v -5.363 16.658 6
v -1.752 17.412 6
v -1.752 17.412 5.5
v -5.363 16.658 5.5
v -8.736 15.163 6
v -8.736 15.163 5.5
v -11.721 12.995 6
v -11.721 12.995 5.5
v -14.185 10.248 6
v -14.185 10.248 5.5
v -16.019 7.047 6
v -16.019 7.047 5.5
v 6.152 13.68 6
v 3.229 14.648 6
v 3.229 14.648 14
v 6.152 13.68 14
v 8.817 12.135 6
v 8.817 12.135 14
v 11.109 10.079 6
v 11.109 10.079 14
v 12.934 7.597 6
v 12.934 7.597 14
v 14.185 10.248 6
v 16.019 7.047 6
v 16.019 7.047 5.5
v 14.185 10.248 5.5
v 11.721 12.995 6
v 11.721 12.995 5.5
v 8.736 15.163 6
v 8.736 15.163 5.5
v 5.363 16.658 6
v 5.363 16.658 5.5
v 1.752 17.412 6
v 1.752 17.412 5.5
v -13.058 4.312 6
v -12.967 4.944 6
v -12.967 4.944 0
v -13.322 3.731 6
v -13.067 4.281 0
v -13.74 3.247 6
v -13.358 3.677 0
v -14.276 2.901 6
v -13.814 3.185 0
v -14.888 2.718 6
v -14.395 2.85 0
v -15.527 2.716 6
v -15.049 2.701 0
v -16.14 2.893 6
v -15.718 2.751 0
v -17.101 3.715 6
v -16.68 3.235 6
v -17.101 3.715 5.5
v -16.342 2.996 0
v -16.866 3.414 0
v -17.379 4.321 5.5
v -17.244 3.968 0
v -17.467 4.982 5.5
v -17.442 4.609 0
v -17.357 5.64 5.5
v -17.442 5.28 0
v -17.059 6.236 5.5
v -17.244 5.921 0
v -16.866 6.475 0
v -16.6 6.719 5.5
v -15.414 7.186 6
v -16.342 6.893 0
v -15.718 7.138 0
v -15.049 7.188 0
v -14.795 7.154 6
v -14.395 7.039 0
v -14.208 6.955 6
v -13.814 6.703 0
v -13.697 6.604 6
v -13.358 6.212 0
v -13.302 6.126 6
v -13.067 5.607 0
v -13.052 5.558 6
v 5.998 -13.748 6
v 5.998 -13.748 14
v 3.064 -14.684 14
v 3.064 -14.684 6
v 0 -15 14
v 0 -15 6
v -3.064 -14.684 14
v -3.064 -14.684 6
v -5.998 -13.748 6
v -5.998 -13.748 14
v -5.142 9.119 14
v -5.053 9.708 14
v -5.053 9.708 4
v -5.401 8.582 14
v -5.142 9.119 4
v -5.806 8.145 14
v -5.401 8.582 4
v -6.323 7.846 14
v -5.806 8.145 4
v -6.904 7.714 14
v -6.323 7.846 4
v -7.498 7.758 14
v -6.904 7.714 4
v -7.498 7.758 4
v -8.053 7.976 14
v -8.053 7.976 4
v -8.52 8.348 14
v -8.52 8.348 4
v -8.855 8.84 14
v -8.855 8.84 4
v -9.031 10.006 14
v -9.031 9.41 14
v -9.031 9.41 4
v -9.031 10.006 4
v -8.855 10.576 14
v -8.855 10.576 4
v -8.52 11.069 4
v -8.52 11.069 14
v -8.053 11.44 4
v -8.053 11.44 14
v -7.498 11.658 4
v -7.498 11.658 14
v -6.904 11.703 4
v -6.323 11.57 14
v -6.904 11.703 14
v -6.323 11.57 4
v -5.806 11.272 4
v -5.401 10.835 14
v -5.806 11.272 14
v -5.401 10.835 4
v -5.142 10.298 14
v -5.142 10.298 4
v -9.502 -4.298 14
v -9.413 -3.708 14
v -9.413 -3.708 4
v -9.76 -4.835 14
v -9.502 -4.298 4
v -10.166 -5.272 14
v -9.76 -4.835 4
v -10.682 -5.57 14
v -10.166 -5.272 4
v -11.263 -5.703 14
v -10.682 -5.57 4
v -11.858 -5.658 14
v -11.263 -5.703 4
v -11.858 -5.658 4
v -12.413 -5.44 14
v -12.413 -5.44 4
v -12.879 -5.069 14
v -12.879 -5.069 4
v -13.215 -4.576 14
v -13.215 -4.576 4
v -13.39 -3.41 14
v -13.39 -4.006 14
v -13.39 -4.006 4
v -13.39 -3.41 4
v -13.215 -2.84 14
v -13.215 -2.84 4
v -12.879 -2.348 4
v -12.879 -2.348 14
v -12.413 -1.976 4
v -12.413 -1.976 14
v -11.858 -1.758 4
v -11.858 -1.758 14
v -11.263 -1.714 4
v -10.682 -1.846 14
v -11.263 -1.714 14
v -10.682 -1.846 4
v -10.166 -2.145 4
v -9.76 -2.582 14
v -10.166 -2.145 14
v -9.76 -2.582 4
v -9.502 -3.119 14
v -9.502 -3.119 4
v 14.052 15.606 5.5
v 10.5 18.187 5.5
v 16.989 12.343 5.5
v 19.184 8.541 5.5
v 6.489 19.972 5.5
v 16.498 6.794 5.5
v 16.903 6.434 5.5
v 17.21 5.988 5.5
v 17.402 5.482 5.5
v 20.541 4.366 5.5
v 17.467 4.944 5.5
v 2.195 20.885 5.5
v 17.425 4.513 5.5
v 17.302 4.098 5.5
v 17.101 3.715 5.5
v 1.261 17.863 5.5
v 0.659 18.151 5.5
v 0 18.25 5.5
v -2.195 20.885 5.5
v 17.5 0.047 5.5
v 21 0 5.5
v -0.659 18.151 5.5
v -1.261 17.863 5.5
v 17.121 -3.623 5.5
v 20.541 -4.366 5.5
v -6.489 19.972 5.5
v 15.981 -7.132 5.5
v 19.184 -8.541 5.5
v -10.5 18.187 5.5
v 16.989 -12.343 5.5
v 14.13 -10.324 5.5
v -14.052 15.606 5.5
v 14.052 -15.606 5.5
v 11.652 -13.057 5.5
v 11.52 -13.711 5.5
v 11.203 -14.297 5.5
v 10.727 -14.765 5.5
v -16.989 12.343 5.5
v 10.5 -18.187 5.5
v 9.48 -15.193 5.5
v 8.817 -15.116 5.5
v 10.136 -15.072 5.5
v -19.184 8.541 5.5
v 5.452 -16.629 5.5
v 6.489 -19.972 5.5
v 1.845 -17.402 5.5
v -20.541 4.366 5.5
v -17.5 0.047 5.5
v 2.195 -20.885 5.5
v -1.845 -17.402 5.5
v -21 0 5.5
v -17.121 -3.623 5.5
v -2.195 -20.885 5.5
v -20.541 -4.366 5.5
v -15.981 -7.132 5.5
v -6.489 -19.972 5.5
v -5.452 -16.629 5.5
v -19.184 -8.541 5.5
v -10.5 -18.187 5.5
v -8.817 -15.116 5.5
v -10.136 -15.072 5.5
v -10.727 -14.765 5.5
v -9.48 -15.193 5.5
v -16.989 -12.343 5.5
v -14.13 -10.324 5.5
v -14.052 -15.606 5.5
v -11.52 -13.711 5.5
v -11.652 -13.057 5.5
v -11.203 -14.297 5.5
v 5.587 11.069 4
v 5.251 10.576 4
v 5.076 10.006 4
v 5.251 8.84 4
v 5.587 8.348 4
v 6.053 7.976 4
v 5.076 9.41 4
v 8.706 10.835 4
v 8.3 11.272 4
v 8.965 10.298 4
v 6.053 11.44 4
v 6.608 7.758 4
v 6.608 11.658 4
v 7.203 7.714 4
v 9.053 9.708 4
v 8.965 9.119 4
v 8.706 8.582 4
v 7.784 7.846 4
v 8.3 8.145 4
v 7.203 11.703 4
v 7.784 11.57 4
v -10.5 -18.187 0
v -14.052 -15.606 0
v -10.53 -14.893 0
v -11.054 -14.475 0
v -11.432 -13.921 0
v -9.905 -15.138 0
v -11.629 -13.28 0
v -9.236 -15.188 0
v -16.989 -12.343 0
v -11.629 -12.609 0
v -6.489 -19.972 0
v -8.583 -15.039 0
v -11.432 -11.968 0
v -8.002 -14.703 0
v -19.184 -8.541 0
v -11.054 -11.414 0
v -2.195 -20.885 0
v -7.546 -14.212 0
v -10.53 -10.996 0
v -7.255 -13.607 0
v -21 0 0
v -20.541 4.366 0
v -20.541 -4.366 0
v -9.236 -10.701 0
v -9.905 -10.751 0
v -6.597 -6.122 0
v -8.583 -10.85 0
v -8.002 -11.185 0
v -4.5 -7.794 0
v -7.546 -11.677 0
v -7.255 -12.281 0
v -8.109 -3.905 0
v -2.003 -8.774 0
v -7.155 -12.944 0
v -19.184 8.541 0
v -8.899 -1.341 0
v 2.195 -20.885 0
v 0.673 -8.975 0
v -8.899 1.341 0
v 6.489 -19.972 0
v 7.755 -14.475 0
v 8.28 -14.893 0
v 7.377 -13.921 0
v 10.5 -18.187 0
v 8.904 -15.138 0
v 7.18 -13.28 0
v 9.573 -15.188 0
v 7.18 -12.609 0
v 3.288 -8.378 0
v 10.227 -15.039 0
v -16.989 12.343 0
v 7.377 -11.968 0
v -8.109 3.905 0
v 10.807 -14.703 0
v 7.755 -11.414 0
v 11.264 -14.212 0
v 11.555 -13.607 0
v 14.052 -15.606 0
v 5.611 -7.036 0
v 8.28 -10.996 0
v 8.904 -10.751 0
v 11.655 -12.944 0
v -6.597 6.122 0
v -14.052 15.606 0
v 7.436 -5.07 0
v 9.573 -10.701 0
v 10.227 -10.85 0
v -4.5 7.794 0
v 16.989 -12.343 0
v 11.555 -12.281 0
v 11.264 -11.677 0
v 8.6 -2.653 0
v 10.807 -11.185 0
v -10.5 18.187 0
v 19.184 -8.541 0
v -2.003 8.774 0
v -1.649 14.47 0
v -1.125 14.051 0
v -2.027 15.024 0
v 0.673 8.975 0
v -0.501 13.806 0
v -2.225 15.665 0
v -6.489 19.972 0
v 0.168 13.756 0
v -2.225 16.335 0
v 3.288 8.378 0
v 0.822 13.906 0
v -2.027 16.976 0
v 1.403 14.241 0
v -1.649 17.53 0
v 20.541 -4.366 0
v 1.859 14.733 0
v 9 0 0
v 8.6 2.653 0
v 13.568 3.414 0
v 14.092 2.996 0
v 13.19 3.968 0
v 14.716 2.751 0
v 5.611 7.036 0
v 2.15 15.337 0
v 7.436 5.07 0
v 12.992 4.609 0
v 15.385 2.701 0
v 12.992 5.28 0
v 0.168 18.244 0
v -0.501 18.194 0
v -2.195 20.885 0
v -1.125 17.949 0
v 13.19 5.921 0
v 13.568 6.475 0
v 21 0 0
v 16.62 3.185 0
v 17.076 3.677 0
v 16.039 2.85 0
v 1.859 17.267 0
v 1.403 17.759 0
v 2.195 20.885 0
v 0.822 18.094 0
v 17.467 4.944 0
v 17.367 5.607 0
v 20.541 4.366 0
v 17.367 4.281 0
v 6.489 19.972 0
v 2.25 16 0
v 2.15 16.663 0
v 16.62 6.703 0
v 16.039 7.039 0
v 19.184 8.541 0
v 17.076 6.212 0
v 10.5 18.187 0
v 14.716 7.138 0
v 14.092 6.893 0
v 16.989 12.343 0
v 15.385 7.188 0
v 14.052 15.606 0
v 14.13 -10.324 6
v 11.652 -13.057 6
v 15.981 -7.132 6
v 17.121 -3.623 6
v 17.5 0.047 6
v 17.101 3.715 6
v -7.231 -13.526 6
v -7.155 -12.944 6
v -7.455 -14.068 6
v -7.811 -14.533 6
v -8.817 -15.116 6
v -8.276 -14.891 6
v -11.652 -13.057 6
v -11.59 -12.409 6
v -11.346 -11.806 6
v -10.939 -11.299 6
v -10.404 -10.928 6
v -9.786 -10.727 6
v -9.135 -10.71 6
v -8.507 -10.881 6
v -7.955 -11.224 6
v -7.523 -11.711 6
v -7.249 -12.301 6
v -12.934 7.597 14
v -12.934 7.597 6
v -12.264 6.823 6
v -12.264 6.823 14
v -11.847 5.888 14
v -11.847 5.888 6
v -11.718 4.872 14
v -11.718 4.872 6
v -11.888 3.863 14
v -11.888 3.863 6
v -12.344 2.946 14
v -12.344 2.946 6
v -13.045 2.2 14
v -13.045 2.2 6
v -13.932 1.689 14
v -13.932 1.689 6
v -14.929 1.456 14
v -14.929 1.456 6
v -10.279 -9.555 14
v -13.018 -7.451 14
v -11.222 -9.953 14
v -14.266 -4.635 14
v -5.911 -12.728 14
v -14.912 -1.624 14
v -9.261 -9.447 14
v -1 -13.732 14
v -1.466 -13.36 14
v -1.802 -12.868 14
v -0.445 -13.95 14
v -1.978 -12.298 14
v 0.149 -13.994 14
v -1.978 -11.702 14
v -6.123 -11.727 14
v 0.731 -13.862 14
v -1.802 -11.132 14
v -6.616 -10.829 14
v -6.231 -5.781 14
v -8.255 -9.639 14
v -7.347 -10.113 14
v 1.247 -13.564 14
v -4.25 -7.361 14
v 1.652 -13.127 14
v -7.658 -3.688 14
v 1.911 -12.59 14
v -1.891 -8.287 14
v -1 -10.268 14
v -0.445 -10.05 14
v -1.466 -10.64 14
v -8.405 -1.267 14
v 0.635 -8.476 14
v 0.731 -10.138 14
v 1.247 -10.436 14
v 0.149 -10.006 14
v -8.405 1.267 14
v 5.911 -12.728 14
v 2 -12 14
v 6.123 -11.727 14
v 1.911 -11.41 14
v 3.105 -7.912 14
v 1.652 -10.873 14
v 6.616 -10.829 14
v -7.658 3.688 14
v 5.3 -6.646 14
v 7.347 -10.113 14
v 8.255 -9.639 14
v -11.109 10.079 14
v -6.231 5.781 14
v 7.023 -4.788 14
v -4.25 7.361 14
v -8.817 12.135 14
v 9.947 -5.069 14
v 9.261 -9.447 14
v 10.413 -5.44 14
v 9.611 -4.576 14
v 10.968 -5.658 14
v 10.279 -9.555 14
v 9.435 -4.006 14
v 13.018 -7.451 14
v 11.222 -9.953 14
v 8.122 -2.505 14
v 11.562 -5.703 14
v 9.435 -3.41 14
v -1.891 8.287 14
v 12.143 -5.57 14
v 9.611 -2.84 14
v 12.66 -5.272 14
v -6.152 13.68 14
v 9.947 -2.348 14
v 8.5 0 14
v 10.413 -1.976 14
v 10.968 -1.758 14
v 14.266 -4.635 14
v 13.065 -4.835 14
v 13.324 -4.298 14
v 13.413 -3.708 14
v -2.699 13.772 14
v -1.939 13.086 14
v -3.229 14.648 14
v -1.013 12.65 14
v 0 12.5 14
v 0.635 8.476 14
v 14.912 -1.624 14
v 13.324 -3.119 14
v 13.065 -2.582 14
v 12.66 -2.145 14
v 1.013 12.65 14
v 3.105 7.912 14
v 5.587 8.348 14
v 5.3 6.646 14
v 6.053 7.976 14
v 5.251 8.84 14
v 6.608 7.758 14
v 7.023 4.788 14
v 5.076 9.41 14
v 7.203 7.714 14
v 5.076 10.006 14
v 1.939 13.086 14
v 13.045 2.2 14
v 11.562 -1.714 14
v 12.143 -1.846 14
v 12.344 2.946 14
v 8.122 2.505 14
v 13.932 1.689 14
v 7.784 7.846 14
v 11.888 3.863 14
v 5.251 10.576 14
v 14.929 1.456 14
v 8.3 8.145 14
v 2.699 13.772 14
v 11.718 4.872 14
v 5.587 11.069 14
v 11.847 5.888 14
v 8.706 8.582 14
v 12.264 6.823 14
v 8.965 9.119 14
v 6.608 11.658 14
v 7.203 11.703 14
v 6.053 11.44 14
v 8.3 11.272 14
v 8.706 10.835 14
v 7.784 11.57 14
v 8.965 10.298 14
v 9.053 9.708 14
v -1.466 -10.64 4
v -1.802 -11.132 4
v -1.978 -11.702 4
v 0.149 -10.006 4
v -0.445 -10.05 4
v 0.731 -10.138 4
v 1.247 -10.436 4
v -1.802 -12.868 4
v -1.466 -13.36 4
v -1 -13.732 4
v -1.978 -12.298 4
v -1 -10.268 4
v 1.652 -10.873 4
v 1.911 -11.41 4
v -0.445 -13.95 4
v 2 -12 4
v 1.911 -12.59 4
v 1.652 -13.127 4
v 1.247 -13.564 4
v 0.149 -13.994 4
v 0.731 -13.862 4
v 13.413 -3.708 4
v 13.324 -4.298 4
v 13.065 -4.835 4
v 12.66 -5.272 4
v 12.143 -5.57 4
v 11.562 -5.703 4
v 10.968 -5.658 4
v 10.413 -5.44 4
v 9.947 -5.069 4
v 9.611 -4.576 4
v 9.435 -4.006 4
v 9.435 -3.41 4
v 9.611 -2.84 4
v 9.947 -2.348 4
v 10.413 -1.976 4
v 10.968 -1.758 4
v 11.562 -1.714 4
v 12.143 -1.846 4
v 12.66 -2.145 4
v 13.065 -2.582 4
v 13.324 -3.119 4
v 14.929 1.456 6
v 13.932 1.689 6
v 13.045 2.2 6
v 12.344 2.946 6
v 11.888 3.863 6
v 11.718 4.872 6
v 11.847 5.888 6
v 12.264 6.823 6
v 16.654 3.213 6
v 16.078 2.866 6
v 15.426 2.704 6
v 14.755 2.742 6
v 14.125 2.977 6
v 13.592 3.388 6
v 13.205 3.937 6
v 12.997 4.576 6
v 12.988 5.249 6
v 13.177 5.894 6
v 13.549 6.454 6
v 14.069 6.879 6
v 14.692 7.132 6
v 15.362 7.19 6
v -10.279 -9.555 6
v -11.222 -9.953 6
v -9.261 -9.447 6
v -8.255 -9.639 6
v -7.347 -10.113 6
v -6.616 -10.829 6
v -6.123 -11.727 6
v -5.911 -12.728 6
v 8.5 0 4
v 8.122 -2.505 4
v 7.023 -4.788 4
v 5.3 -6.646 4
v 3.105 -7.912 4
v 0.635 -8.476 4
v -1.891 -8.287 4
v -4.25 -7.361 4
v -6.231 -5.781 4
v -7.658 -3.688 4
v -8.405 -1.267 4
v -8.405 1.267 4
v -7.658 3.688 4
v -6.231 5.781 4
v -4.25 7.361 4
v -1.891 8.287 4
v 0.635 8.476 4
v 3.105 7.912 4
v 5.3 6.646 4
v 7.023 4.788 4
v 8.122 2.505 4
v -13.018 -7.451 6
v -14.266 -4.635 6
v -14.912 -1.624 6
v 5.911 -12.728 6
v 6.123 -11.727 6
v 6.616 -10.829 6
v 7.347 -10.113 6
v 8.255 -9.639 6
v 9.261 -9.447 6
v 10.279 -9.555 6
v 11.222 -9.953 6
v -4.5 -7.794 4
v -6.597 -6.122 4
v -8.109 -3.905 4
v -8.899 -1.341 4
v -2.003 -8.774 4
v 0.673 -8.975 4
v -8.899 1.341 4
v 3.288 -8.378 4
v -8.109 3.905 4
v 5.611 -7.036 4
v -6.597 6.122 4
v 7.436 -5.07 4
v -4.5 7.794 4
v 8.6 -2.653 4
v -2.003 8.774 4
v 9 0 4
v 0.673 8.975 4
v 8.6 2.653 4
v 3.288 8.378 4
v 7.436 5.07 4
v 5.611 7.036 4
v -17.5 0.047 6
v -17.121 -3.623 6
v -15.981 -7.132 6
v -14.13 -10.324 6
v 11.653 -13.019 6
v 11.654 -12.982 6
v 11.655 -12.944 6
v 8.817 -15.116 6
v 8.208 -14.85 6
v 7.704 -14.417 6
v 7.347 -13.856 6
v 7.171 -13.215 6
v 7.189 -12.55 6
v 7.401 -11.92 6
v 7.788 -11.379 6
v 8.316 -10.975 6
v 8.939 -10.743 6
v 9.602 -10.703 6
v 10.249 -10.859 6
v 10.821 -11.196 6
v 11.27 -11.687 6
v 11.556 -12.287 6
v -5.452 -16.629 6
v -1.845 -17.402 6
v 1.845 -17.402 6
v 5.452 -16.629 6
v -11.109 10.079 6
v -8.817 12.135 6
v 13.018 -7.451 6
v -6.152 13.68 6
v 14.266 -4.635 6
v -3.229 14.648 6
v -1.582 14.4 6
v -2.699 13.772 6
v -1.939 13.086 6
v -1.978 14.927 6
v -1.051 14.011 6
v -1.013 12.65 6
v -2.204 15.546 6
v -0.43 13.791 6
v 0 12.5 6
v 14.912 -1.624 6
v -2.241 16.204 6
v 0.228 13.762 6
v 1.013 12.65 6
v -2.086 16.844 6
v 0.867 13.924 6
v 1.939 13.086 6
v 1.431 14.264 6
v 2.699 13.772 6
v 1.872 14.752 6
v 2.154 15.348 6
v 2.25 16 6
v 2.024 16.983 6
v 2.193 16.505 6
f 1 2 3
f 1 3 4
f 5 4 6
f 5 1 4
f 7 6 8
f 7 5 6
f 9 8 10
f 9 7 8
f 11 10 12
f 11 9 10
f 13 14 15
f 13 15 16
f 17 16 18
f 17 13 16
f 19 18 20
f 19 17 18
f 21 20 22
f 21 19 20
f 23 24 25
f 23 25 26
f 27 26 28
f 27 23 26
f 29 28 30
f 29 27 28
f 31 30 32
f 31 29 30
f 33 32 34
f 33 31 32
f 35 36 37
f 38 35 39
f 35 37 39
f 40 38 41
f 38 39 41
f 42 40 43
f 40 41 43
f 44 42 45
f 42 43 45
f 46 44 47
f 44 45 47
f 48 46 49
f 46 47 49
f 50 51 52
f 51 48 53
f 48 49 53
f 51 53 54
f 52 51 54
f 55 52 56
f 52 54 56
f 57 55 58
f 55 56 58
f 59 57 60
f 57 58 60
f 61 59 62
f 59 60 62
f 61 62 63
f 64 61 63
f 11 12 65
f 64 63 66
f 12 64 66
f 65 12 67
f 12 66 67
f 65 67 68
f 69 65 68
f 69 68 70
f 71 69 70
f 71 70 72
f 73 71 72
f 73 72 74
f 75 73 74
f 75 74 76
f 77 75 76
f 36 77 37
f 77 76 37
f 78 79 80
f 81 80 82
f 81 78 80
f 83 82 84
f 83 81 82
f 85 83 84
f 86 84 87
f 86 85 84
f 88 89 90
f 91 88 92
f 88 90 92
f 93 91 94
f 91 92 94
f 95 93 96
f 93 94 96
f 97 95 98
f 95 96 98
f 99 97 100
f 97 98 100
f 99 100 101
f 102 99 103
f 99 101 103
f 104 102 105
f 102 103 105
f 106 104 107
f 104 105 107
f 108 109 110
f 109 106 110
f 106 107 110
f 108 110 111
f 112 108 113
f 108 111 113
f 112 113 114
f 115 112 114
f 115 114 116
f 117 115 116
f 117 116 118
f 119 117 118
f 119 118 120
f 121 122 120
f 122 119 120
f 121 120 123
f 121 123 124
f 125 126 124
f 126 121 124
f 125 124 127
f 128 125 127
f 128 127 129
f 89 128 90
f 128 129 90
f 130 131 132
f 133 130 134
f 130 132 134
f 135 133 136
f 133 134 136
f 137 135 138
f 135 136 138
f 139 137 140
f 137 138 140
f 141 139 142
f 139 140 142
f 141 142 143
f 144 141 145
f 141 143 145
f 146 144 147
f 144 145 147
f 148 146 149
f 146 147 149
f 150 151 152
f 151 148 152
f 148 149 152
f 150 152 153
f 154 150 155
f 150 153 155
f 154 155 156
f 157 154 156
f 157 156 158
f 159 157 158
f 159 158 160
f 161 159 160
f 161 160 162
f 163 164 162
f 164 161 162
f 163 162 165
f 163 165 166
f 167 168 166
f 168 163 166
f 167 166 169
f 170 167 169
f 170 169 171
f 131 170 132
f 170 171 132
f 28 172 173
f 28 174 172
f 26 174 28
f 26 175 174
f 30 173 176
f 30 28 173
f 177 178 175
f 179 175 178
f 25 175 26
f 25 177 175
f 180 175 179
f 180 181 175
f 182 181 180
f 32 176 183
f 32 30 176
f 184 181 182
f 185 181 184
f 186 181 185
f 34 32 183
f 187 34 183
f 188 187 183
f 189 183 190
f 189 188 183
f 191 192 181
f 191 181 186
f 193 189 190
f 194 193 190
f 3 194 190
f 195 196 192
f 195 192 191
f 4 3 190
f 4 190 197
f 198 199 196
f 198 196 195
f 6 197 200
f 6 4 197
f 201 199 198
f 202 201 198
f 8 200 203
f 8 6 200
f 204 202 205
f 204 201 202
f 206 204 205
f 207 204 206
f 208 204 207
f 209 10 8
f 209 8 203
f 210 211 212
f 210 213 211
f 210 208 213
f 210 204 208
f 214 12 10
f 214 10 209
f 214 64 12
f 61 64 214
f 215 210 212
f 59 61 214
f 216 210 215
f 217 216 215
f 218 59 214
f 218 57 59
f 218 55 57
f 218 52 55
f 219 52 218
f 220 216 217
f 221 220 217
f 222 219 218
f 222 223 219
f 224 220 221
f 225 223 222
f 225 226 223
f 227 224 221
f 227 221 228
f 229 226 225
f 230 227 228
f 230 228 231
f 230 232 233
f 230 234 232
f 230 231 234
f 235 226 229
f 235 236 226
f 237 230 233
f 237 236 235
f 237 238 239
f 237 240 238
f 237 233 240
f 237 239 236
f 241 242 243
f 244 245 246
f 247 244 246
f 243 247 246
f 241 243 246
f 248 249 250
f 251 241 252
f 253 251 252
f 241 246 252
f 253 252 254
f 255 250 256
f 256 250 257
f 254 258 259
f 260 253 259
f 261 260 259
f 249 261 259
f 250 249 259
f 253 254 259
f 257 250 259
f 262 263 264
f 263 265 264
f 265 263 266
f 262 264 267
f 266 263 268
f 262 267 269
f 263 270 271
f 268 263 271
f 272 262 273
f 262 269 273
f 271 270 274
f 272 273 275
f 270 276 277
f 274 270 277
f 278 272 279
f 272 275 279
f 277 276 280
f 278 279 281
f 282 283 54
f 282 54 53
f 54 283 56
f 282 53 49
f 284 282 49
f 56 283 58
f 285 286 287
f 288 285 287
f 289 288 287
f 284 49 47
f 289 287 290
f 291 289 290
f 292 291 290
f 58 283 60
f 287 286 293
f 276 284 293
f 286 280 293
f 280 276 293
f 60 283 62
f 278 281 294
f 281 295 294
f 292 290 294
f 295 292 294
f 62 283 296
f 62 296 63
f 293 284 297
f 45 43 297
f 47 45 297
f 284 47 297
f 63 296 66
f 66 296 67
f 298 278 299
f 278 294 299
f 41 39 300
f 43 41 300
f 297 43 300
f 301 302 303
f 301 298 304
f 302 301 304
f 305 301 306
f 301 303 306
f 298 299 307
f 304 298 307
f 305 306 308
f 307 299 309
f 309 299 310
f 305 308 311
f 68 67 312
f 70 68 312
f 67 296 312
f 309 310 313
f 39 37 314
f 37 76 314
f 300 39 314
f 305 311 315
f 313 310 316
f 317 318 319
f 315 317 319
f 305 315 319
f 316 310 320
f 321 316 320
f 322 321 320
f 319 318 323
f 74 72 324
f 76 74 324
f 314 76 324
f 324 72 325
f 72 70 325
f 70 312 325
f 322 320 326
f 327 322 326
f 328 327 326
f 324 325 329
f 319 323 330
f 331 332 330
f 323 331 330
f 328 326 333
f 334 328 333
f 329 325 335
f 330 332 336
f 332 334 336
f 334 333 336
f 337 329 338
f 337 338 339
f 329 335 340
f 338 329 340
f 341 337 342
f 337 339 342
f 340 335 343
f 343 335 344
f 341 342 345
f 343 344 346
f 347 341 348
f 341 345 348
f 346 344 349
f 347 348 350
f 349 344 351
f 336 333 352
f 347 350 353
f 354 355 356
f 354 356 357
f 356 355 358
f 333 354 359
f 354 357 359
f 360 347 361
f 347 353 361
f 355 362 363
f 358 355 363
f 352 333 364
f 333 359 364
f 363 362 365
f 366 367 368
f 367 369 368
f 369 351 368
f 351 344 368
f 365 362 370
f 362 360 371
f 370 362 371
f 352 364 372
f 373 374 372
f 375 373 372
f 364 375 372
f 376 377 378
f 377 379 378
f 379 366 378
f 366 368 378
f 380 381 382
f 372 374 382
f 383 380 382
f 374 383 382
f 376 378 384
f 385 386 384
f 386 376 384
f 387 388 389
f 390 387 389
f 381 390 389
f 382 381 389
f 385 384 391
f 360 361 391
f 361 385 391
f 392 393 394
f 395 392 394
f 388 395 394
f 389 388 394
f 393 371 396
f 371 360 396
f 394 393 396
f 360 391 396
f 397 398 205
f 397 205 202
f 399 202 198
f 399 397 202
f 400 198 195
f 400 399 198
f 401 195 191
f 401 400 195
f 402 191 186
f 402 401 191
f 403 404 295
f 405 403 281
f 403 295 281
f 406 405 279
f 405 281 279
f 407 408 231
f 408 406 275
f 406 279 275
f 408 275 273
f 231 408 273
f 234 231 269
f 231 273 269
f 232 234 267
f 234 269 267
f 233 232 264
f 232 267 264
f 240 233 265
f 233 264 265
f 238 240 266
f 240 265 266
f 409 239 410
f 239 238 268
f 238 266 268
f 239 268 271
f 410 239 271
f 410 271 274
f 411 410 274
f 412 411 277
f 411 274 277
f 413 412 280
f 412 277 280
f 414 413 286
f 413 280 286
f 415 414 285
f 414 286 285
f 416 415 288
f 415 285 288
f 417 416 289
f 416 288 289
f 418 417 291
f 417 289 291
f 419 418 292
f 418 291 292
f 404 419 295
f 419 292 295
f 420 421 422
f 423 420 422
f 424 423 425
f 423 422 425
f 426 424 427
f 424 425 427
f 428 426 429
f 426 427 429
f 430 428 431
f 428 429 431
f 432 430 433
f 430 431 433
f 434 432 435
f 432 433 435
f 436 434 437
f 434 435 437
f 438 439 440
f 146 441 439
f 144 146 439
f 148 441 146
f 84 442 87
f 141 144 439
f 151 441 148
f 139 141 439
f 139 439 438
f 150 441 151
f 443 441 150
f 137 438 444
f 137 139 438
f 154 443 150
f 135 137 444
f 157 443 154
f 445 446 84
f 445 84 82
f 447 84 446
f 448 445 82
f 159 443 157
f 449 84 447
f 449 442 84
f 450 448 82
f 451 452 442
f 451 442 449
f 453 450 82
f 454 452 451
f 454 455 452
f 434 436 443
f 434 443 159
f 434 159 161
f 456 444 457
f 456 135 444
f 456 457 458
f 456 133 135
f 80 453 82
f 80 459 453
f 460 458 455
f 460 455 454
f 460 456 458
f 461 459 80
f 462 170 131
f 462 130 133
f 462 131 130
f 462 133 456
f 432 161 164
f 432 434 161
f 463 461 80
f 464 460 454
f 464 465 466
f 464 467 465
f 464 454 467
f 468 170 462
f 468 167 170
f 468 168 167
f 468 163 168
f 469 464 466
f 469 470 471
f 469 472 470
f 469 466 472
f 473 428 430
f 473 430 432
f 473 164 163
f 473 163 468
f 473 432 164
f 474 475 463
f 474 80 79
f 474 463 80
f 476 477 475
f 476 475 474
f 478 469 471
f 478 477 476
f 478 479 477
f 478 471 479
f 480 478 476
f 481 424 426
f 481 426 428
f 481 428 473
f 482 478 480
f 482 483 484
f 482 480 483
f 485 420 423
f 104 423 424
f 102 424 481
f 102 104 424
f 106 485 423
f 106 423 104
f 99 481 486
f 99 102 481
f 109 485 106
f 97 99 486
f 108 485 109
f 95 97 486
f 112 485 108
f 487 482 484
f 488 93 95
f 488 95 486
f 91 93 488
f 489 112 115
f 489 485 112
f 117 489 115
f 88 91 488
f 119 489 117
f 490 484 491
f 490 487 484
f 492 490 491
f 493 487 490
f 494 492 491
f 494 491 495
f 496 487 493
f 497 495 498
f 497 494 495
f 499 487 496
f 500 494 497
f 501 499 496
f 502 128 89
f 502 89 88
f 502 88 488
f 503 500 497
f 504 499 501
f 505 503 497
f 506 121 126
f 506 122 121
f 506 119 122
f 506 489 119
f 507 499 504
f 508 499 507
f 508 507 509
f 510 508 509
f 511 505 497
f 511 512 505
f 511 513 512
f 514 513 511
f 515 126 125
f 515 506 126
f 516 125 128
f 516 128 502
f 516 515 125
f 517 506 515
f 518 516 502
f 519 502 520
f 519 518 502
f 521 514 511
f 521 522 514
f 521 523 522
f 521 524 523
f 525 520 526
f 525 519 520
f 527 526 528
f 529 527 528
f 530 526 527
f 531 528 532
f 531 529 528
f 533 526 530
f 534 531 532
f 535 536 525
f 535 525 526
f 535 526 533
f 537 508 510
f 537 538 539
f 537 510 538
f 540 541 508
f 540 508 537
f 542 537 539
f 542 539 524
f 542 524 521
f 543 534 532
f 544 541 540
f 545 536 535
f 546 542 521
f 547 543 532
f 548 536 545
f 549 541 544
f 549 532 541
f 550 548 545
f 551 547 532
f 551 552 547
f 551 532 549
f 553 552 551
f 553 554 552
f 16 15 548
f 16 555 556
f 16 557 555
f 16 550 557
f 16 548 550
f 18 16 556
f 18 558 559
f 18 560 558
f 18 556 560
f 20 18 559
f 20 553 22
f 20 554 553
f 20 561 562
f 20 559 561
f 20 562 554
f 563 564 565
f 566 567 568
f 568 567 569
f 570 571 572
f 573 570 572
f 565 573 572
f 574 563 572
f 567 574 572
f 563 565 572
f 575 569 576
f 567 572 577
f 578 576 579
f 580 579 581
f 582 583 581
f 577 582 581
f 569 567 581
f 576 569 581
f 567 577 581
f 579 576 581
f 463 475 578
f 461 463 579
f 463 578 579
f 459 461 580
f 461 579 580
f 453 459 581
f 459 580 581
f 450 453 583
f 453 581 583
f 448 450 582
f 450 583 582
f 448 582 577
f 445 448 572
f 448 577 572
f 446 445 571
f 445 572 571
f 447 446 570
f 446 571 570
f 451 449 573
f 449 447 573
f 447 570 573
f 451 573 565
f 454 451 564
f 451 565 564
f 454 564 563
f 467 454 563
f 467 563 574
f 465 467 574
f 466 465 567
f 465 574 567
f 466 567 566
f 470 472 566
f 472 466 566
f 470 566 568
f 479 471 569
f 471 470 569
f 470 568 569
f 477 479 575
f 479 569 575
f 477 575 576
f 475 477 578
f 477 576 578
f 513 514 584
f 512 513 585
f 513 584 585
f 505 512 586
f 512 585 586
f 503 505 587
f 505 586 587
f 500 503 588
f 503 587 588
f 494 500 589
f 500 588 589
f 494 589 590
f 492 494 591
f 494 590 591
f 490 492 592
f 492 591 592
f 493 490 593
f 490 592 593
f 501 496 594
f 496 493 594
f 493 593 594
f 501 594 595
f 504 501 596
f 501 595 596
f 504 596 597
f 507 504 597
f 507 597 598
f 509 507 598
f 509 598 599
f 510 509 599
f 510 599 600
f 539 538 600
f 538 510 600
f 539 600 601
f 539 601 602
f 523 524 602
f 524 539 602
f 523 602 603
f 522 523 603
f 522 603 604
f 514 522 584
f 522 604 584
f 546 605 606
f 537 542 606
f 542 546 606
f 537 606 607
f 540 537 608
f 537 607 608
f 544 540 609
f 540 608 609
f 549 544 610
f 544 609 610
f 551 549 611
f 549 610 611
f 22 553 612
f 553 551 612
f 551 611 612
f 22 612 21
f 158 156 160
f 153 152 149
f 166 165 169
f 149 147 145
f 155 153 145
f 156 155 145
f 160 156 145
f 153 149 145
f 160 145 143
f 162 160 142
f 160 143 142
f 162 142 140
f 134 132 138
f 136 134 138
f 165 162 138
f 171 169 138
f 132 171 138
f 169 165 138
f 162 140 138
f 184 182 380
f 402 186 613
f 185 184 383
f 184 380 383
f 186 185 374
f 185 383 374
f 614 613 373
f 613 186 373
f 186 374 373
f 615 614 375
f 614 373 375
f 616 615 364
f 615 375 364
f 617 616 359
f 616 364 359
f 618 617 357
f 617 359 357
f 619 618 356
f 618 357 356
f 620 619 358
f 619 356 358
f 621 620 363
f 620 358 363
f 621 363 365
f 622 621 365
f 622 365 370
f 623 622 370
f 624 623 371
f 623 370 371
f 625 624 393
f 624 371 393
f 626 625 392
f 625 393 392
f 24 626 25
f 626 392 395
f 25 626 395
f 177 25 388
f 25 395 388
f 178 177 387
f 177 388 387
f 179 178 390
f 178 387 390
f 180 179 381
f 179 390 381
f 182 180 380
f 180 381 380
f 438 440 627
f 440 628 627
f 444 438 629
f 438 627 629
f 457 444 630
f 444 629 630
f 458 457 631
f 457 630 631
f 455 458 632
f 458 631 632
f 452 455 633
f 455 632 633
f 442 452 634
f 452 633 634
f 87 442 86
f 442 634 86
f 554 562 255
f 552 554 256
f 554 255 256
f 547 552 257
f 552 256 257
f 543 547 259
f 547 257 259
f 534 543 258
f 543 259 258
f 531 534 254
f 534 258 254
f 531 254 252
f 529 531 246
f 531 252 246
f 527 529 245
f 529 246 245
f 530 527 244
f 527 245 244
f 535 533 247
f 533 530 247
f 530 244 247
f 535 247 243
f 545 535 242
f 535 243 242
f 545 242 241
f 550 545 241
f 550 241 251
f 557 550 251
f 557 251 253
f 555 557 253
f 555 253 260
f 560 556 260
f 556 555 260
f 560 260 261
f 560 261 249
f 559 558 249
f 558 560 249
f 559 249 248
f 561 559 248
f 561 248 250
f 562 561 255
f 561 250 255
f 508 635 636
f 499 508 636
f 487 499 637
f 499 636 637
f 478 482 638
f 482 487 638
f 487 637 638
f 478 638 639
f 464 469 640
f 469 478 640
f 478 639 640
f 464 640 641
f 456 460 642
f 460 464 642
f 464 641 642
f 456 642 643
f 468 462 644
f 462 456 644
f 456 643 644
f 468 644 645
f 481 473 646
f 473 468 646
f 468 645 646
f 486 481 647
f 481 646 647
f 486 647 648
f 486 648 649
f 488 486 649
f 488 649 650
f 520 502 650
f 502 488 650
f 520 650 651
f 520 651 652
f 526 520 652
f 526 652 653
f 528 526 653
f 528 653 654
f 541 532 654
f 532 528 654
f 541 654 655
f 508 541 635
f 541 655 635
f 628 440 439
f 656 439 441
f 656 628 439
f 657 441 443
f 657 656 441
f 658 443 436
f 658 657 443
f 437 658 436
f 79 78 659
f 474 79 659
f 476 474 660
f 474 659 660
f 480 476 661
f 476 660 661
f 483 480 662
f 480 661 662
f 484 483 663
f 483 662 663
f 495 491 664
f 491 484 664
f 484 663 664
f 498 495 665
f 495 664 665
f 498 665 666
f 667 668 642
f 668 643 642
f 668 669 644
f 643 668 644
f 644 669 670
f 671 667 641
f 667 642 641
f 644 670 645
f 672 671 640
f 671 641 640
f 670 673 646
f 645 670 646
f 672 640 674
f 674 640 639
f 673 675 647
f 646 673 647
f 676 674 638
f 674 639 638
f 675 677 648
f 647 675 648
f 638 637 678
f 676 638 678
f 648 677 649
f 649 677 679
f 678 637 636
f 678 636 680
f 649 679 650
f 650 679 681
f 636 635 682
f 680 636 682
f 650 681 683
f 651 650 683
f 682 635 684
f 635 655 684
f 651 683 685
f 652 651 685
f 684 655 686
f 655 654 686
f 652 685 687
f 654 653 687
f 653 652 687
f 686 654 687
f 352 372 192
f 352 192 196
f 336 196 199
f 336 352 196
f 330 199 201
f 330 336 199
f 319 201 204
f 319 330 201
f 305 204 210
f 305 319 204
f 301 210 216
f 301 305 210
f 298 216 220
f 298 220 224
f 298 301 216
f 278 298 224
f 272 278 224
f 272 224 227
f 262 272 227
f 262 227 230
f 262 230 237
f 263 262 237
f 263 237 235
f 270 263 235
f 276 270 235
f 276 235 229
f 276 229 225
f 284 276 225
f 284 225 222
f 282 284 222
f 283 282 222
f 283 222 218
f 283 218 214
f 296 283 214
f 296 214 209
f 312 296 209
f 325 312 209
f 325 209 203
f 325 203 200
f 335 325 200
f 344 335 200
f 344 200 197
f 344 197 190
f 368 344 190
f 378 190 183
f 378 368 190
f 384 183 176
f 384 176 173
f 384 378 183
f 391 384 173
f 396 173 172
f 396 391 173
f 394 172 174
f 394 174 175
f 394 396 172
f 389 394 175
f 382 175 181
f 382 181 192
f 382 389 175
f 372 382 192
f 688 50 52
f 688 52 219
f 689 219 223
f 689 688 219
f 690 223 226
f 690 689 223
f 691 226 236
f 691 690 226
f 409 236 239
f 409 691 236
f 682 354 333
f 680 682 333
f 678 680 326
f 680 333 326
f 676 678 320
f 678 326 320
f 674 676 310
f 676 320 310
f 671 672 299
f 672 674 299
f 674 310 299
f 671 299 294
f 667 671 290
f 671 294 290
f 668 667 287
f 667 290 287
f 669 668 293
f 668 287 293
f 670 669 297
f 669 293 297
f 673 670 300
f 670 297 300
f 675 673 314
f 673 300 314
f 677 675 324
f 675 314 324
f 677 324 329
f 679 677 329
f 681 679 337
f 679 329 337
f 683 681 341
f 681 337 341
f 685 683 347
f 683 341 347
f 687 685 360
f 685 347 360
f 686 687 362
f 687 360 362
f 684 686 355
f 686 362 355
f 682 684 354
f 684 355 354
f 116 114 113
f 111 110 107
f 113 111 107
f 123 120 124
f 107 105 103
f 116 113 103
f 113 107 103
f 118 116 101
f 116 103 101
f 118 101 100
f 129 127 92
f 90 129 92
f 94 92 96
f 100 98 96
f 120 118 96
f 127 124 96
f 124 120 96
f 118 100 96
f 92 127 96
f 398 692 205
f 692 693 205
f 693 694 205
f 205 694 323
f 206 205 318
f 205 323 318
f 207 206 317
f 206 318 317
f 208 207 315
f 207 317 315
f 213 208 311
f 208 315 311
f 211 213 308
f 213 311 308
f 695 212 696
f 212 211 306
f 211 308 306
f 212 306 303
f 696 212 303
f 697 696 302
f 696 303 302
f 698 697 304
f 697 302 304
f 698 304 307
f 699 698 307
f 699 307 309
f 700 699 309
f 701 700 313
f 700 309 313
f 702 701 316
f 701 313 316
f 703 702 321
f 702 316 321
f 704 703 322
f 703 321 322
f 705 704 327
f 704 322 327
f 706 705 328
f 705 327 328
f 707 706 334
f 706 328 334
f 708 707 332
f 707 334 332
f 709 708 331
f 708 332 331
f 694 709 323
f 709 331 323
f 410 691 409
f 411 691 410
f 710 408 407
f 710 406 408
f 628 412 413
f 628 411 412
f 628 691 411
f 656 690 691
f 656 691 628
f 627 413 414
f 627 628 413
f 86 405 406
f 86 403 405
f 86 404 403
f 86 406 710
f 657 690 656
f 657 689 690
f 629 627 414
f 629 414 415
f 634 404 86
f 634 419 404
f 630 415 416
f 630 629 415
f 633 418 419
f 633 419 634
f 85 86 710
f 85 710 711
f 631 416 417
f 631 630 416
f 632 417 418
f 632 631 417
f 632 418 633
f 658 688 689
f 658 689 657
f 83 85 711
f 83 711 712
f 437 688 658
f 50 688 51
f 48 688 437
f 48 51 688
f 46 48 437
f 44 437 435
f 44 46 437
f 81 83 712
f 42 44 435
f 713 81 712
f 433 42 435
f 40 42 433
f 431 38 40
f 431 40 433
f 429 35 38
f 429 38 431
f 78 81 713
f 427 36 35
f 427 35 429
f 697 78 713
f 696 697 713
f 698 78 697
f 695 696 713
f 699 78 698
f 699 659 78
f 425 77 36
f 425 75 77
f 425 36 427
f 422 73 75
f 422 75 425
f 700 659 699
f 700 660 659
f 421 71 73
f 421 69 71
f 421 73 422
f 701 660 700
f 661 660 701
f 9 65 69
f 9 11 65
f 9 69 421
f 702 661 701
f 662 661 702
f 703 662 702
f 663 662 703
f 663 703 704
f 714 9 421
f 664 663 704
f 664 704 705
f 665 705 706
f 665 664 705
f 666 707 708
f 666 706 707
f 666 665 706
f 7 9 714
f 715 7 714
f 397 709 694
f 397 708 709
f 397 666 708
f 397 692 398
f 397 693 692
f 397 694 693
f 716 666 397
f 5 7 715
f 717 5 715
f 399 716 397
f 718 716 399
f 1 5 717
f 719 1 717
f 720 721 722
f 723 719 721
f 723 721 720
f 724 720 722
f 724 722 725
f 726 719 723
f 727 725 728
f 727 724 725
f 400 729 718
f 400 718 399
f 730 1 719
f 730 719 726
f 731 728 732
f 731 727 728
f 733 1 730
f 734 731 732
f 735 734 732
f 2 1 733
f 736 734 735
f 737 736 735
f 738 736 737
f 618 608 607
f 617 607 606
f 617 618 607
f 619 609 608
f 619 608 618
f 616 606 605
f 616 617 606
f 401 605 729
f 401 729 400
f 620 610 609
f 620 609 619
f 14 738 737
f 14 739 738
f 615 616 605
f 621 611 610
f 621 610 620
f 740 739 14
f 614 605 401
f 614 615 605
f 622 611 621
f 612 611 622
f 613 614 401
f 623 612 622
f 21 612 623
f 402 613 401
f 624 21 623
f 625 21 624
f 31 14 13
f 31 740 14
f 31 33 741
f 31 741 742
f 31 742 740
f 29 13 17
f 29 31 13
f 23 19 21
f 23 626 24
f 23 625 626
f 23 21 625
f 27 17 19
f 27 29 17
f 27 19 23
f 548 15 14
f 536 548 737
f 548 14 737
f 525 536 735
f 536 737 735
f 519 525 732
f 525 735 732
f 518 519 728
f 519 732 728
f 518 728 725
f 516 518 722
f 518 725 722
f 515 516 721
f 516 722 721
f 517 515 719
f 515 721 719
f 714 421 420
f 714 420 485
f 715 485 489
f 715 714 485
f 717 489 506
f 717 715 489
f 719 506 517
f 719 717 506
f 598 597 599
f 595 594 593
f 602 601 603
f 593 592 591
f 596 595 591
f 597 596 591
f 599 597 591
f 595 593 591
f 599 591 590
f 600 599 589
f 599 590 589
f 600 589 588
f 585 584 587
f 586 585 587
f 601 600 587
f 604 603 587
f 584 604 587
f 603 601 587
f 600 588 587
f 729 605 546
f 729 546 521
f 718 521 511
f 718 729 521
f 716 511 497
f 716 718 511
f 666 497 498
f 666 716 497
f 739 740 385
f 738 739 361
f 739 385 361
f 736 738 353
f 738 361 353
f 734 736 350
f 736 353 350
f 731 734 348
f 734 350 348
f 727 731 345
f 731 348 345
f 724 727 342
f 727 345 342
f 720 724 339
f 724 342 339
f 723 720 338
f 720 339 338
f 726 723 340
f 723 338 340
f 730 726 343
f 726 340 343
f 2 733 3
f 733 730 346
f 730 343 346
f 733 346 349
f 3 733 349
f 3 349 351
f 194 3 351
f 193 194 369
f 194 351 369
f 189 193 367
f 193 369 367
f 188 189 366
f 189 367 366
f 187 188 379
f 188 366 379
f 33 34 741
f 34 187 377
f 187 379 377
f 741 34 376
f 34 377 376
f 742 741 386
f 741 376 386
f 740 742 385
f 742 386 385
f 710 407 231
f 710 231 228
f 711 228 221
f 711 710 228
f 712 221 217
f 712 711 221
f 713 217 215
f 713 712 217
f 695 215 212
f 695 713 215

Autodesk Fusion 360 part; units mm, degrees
sketch "Sketch1" plane through (0, 0, 0) normal (0, 0, 1) x (1, 0, 0)
  circle A0 centre (0, 0) radius 9
  circle A1 centre (0, 0) radius 16 construction
  line L0 (0, 0) -> (0, 16) construction
  circle A2 centre (0, 16) radius 3.5
  circle A3 centre (-15.2169, 4.9443) radius 3.5
  circle A4 centre (-9.4046, -12.9443) radius 3.5
  circle A5 centre (9.4046, -12.9443) radius 3.5
  circle A6 centre (15.2169, 4.9443) radius 3.5
  circle A7 centre (0, 0) radius 15
  circle A8 centre (0, 0) radius 21
  circle A9 centre (0, 0) radius 12 construction
  line L1 (0, 0) -> (-8.8168, 12.1353) construction
  circle A10 centre (-7.0534, 9.7082) radius 2
  circle A11 centre (-7.0534, 9.7082) radius 2.25 construction
  circle A12 centre (-11.4127, -3.7082) radius 2
  circle A13 centre (0, -12) radius 2
  circle A14 centre (11.4127, -3.7082) radius 2
  circle A15 centre (7.0534, 9.7082) radius 2
  line L2 (0, 0) -> (-15.2169, 4.9443) construction
  circle A16 centre (0, 16) radius 2.25
  circle A17 centre (-15.2169, 4.9443) radius 2.25
  circle A18 centre (-9.4046, -12.9443) radius 2.25
  circle A19 centre (9.4046, -12.9443) radius 2.25
  circle A20 centre (15.2169, 4.9443) radius 2.25
  circle A21 centre (0, 0) radius 8.5
  dimension "d1" = 18
  dimension "d3" = 7
  dimension "d5" = 360
  dimension "d6" = 30
  dimension "d7" = 42
  dimension "d8" = 4
  dimension "d9" = 4.5
  dimension "d10" = 24
  dimension "d12" = 360
  dimension "d13" = 36
  dimension "d14" = 72
  dimension "d17" = 4.5
  dimension "d19" = 360
  dimension "d26" = 17
  dimension "d31" = 32
extrude "Extrude1" add sketch "Sketch1" along normal blind 6 contours A2 A3 A4 A5 A6 A7 | A8
extrude "Extrude6" add sketch "Sketch1" along normal blind 14 contours A2 A3 A4 A5 A6 A7
extrude "Extrude7" add sketch "Sketch1" along normal blind 6 contours A2 A7 A16 | A2 A7 A16 | A3 A7 A17 | A3 A7 A17 | A6 A7 A20 | A6 A7 A20 | A4 A7 A18 | A4 A7 A18 | A5 A7 A19 | A5 A7 A19
extrude "Extrude4" add sketch "Sketch1" along normal blind 14 contours A0
extrude "Extrude5" cut sketch "Sketch1" along normal blind 4 contours A0
sketch "Sketch2" plane through (0, 0, 6) normal (0, 0, 1) x (-1, 0, 0)
  circle A0 centre (0, 0) radius 21
  arc A1 (-12.9338, -7.5971) -> (-3.2285, -14.6484) centre (0, 0) ccw
  arc A2 (-12.9338, -7.5971) -> (-14.9292, -1.4561) centre (-15.2169, -4.9443) ccw
  arc A3 (-11.2221, 9.9532) -> (-14.9292, -1.4561) centre (0, 0) ccw
  arc A4 (-11.2221, 9.9532) -> (-5.9982, 13.7485) centre (-9.4046, 12.9443) ccw
  arc A5 (5.9982, 13.7485) -> (-5.9982, 13.7485) centre (0, 0) ccw
  arc A6 (5.9982, 13.7485) -> (11.2221, 9.9532) centre (9.4046, 12.9443) ccw
  arc A7 (14.9292, -1.4561) -> (11.2221, 9.9532) centre (0, 0) ccw
  arc A8 (14.9292, -1.4561) -> (12.9338, -7.5971) centre (15.2169, -4.9443) ccw
  arc A9 (3.2285, -14.6484) -> (12.9338, -7.5971) centre (0, 0) ccw
  arc A10 (3.2285, -14.6484) -> (-3.2285, -14.6484) centre (0, -16) ccw
  circle A11 centre (0, 0) radius 17.5
  circle A12 centre (9.4046, 12.9443) radius 2.25
  circle A13 centre (15.2169, -4.9443) radius 2.25
  circle A14 centre (-9.4046, 12.9443) radius 2.25
  circle A15 centre (0, -16) radius 2.25
  circle A16 centre (-15.2169, -4.9443) radius 2.25
  dimension "d36" = 35
extrude "Extrude8" cut sketch "Sketch2" against normal blind 0.5 contours A0
sketch "Sketch3" plane through (0, 0, 0) normal (0, 0, -1) x (1, 0, 0)
  circle A0 centre (0, 0) radius 9
  circle A1 centre (-9.4046, 12.9443) radius 2.25
  circle A2 centre (-15.2169, -4.9443) radius 2.25
  circle A3 centre (9.4046, 12.9443) radius 2.25
  circle A4 centre (0, -16) radius 2.25
  circle A5 centre (15.2169, -4.9443) radius 2.25
  circle A6 centre (-7.0534, -9.7082) radius 2
  circle A7 centre (11.4127, 3.7082) radius 2
  circle A8 centre (0, 12) radius 2
  circle A9 centre (7.0534, -9.7082) radius 2
  circle A10 centre (-11.4127, 3.7082) radius 2
  circle A11 centre (0, 0) radius 21
extrude "Extrude9" add sketch "Sketch3" against normal blind 4 contours A6 | A7 | A8 | A9 | A10
equation "d10 = ( d6 - d1 ) / 2 + d1"
equation "d13 = d14 / 2"
